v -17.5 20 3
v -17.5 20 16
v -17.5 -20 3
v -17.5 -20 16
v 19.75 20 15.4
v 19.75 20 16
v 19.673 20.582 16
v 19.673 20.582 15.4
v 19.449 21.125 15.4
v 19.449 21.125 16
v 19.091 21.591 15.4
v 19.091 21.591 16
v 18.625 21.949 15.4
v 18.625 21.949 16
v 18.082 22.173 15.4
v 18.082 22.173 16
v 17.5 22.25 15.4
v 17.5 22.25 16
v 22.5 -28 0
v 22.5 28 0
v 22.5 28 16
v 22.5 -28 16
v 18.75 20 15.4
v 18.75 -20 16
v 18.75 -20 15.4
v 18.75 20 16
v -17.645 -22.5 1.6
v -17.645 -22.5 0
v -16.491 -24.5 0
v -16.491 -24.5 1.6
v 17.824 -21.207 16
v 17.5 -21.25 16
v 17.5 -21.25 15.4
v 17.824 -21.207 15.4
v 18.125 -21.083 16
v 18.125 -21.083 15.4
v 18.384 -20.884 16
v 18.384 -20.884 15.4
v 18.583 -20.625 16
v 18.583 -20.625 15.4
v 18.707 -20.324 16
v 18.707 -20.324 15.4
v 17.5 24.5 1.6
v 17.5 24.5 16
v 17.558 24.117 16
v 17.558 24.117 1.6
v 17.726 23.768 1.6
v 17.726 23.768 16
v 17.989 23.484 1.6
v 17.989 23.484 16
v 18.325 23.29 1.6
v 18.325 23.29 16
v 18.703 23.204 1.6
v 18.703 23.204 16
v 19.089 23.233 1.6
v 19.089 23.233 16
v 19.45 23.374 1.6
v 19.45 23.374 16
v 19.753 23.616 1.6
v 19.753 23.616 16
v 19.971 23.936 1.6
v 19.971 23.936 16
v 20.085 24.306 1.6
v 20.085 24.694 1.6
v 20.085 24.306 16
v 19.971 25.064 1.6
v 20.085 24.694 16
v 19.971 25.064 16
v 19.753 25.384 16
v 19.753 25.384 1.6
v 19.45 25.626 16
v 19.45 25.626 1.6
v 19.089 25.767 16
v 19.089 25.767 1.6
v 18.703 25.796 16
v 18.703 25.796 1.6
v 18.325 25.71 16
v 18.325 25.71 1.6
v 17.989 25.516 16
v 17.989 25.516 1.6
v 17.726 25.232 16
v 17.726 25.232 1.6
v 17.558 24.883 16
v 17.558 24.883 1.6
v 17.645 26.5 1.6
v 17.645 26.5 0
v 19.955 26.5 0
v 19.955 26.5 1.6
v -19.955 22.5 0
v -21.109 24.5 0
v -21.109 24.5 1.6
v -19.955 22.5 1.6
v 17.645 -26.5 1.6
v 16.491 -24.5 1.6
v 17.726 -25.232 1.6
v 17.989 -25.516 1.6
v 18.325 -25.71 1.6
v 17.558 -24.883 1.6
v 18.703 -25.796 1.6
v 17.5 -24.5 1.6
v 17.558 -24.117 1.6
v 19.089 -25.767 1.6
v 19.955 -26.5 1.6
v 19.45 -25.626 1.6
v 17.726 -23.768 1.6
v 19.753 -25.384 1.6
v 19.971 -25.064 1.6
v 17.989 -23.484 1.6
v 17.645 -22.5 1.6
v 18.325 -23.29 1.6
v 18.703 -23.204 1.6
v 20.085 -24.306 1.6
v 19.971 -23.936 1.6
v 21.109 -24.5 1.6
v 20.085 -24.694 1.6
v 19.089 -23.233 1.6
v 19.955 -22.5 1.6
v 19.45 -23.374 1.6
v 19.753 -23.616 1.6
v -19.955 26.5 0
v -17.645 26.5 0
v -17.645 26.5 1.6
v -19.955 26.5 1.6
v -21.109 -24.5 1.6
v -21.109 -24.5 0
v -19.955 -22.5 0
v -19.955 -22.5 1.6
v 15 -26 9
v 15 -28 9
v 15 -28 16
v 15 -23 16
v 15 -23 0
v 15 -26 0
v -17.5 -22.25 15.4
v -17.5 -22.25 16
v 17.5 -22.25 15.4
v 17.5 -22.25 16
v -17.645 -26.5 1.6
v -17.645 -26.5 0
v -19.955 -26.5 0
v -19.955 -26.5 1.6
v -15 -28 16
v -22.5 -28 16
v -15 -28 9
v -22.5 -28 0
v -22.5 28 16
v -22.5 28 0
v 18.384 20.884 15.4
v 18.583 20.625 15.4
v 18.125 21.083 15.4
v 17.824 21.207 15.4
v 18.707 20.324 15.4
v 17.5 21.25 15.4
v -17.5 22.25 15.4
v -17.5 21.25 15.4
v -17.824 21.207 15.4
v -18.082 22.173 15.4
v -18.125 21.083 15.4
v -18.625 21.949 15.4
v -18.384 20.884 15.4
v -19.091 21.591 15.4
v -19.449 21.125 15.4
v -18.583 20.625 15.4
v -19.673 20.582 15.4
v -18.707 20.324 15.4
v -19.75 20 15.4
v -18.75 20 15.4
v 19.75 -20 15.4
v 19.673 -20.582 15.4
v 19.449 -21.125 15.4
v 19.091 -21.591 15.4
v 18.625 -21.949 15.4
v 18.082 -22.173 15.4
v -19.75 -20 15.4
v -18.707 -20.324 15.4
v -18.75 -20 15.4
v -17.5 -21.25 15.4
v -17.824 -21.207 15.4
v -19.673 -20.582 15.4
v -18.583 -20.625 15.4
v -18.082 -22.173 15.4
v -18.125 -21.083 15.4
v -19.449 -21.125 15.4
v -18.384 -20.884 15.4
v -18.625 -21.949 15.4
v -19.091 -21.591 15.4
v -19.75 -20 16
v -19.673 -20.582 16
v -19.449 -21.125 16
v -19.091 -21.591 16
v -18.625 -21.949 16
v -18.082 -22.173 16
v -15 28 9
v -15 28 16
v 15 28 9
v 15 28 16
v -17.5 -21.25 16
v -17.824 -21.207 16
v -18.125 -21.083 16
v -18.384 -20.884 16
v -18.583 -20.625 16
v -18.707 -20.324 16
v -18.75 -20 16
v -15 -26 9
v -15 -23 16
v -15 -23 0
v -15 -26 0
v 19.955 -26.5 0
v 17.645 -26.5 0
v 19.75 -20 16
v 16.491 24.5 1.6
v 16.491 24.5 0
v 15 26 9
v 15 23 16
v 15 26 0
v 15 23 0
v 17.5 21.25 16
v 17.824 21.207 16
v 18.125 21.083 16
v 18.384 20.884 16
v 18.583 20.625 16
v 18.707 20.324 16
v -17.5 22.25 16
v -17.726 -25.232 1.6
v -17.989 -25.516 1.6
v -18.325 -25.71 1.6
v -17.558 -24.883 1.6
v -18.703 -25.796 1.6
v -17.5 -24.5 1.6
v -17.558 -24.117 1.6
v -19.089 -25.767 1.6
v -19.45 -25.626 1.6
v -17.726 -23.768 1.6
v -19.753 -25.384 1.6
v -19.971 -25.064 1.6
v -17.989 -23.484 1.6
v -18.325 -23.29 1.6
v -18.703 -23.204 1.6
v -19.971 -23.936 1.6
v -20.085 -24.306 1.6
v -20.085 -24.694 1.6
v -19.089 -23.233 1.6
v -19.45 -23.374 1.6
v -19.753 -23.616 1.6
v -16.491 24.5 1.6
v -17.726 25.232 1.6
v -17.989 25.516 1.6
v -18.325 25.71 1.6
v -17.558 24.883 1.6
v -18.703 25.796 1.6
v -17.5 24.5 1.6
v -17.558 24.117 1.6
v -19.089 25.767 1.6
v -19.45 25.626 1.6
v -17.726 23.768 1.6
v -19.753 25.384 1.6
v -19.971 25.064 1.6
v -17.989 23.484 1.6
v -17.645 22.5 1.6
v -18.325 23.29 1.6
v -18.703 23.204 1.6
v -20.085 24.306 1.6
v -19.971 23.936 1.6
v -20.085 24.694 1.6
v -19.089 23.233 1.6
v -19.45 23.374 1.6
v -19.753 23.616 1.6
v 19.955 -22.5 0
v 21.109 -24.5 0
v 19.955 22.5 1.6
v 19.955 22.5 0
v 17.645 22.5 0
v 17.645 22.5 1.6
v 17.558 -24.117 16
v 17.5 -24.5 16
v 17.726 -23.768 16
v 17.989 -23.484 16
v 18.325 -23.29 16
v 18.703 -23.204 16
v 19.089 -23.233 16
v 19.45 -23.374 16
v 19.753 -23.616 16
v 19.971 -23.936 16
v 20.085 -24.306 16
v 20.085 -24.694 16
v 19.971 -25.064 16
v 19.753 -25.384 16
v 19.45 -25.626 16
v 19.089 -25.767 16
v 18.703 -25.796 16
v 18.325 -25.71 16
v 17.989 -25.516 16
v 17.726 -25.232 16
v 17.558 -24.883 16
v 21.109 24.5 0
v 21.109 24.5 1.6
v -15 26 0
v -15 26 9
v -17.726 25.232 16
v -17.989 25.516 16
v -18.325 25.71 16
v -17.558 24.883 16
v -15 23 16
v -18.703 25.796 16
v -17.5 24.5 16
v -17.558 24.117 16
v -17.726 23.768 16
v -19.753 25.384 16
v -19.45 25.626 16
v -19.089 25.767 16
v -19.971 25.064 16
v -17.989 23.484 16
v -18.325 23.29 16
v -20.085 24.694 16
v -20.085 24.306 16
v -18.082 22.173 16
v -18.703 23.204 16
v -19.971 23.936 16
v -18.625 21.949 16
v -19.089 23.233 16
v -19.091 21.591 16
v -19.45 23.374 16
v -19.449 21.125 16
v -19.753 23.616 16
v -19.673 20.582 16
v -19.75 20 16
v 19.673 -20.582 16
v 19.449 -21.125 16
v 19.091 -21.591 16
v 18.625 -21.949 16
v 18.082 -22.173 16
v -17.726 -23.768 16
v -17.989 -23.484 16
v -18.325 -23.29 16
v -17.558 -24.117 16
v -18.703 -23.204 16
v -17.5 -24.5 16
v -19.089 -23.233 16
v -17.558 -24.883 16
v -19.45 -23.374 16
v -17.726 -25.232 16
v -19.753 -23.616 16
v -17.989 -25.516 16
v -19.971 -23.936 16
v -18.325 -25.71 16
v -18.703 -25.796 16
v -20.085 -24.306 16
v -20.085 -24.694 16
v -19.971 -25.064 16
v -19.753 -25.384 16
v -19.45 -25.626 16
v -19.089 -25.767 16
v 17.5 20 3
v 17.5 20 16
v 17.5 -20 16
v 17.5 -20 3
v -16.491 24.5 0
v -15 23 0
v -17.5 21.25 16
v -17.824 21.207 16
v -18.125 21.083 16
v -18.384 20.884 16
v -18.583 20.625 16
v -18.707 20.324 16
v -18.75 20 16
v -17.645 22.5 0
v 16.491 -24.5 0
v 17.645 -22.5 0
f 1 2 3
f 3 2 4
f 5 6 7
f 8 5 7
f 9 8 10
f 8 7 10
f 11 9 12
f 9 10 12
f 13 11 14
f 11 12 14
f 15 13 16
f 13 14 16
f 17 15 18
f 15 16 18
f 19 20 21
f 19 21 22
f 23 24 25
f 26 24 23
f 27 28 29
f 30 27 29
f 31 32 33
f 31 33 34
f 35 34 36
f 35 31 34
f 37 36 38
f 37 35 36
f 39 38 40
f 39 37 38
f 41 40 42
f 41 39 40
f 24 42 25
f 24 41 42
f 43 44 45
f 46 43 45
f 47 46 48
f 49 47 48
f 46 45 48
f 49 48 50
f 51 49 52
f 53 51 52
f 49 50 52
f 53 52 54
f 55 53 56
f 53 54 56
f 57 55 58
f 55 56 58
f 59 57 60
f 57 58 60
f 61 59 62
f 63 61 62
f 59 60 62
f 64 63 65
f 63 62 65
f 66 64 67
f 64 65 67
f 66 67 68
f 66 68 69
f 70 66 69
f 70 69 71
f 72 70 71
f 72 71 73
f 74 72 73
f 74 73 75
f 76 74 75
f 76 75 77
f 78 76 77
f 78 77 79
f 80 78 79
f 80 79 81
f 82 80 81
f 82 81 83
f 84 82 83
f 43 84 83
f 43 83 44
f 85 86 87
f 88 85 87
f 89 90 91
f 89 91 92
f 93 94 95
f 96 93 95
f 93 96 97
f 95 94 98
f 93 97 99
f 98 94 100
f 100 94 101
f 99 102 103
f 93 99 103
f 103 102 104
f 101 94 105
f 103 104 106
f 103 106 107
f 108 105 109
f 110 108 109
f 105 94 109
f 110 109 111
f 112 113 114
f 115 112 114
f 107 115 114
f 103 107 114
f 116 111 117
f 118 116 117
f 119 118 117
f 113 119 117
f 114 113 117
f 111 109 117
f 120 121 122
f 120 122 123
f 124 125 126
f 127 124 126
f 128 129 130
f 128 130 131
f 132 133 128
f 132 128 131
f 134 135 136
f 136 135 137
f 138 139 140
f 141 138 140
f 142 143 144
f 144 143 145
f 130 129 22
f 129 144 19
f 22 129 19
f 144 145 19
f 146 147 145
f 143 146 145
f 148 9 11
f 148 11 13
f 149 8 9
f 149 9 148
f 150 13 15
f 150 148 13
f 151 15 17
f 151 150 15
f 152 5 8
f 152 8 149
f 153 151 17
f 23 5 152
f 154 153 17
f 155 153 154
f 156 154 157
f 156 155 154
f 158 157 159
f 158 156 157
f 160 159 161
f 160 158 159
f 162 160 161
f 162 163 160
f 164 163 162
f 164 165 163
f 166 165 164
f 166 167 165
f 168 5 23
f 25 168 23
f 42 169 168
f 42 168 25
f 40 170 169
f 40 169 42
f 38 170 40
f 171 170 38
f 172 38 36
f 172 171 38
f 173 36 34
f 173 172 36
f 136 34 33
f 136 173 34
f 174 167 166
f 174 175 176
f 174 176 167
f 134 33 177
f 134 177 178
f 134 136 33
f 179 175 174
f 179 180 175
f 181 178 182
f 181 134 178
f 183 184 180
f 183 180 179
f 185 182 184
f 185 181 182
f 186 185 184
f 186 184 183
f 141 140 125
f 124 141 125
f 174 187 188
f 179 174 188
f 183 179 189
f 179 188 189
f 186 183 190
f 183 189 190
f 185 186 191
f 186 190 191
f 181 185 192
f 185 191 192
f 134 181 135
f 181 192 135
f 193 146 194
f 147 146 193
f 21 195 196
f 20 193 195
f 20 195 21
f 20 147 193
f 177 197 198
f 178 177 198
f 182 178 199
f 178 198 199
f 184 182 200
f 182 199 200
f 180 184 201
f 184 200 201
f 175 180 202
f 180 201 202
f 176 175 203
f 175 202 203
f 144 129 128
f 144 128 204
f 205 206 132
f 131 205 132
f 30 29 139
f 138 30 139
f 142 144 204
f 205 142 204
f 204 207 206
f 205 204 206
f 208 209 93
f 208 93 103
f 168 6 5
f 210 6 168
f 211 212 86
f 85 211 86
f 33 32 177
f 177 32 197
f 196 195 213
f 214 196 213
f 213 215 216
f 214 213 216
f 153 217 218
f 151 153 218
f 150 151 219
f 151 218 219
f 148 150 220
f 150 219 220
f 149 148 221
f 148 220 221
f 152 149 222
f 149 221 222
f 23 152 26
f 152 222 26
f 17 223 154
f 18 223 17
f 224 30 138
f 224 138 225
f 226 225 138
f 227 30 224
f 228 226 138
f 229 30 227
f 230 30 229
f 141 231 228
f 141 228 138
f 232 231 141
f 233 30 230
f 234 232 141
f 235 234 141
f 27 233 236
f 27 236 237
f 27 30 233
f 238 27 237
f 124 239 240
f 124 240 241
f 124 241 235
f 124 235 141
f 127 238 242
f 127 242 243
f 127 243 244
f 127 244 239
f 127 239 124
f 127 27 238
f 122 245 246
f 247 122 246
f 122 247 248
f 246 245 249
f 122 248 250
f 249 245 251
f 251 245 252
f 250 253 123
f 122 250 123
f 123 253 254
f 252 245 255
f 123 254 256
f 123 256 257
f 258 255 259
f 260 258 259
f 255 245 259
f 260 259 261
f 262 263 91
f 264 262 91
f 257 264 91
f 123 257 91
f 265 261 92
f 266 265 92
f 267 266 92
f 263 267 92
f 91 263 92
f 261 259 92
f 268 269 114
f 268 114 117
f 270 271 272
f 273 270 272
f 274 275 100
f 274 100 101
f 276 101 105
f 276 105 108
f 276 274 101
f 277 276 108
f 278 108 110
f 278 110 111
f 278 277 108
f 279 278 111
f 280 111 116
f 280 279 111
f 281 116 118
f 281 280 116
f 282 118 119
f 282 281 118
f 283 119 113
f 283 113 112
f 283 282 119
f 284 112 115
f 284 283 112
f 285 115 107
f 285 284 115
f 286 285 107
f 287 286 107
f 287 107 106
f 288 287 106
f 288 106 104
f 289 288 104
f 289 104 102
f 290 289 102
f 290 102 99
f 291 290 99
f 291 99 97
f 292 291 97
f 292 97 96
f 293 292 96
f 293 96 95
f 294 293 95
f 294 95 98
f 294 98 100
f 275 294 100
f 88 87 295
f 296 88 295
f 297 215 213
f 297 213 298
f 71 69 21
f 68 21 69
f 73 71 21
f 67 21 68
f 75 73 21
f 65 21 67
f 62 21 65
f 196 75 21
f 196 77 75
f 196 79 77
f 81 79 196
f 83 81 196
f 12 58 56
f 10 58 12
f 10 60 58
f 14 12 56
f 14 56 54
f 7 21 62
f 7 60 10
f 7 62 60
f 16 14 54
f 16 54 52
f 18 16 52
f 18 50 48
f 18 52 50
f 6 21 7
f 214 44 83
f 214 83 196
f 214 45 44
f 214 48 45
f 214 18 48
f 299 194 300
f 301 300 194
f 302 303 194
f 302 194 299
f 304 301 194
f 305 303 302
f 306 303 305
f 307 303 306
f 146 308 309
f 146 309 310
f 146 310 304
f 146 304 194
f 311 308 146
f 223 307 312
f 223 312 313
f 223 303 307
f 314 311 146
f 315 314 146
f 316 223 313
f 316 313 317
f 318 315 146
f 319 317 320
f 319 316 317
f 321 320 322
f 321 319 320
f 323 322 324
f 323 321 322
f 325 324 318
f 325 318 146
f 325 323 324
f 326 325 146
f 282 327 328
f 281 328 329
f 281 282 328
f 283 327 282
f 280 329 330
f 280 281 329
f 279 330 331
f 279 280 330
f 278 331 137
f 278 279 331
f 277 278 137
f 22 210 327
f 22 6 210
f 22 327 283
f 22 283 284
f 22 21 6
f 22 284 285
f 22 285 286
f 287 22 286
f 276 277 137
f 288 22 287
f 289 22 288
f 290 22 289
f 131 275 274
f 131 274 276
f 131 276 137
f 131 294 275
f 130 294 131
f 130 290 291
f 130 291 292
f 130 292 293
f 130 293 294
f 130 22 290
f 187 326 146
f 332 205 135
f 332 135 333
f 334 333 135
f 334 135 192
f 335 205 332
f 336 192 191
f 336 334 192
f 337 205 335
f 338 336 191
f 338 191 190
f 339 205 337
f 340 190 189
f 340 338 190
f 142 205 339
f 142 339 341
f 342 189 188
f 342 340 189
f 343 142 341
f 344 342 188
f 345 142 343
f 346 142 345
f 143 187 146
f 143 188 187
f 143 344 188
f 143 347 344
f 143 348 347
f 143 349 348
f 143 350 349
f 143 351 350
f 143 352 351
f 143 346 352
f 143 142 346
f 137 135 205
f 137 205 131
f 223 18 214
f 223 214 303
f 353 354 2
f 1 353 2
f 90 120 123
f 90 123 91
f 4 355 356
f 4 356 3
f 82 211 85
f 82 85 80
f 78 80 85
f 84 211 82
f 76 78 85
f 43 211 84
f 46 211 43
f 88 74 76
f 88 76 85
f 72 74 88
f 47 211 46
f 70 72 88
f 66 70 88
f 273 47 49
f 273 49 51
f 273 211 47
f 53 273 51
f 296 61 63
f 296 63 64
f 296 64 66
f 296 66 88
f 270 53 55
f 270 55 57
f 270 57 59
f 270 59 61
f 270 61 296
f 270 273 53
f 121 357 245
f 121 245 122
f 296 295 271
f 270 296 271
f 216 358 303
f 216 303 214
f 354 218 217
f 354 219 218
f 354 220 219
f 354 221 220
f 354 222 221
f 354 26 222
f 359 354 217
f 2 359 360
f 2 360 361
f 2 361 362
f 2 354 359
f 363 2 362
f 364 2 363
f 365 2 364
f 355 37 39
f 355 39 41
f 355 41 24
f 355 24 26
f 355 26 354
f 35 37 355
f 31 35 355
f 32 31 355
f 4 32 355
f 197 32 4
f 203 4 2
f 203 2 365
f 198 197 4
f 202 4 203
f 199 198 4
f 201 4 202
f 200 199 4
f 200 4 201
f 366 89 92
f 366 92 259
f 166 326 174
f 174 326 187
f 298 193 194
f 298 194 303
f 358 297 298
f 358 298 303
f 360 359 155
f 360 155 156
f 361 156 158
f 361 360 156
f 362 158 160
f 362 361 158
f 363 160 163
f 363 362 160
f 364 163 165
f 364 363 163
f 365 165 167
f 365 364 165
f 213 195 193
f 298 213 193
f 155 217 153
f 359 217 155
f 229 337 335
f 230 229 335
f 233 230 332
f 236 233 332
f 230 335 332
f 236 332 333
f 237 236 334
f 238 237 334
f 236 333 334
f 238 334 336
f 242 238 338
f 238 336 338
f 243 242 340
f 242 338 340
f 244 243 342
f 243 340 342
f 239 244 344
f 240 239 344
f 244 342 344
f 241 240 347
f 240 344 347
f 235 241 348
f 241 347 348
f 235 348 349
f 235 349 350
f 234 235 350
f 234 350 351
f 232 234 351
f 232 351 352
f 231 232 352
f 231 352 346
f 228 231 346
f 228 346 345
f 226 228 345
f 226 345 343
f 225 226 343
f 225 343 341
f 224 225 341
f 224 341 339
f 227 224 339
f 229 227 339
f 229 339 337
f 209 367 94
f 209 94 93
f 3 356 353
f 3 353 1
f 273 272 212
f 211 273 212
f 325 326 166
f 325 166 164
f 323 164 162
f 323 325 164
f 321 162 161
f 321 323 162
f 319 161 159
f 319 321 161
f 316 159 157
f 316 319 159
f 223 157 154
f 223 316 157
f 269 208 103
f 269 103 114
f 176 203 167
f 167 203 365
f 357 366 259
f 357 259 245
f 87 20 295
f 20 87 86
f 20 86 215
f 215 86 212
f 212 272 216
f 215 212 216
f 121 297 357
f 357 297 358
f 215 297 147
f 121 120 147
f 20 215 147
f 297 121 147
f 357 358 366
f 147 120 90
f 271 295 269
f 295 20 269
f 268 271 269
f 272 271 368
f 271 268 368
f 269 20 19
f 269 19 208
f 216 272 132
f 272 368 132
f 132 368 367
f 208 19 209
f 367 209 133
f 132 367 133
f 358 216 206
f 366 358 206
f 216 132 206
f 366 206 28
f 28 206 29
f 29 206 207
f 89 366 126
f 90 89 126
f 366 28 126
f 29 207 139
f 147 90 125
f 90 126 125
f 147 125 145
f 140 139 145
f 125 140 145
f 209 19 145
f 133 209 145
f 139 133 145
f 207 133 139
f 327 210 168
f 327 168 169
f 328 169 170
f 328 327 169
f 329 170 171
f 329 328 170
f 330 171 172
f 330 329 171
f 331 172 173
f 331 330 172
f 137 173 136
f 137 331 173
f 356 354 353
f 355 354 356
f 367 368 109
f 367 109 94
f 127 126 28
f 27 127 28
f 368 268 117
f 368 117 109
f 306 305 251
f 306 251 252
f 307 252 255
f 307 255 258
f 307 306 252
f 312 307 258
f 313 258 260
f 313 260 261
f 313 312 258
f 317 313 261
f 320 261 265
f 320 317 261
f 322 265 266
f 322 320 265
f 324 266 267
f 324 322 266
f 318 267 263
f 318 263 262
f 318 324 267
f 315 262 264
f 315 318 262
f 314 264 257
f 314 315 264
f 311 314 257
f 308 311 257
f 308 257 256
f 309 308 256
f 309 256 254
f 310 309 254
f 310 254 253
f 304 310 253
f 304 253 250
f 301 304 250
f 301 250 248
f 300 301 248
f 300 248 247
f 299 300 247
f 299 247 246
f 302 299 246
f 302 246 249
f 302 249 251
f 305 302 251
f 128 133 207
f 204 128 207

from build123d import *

# Parameters (mm, degrees)
F1_DEPTH  = 16
F2_W      = 17.5
F2_H      = 20
F3_DEPTH  = 13
F5_DEPTH  = 0.6
F7_DEPTH  = 1.6
F9_D      = 2.6
F10_W     = 15
F10_H     = 4.3693144321
F11_DEPTH = 7


with BuildPart() as f1:
    # F0 (on Top) → F1 (new body)
    with BuildSketch(Plane.XY):
        Polygon((15, 23), (0, 23), (0, 0), (22.5, 0), (22.5, 28), (0, 28), (0, 26), (15, 26), align=None)
    extrude(amount=F1_DEPTH)

    # F2 (on face) → F3 (cut)
    with BuildSketch(Plane.XY.offset(16)):
        with Locations((8.75, 10)):
            Rectangle(F2_W, F2_H)
    extrude(amount=-F3_DEPTH, mode=Mode.SUBTRACT)

    # F4 (on face) → F5 (cut)
    with BuildSketch(Plane.XY.offset(16)):
        with BuildLine():
            Line((17.5, 22.25), (0, 22.25))
            Line((0, 22.25), (0, 21.25))
            Line((0, 21.25), (17.5, 21.25))
            ThreePointArc((17.5, 21.25), (18.3838834765, 20.8838834765), (18.75, 20))
            Line((18.75, 20), (18.75, 0))
            Line((18.75, 0), (19.75, 0))
            Line((19.75, 0), (19.75, 20))
            ThreePointArc((19.75, 20), (19.0909902577, 21.5909902577), (17.5, 22.25))
        make_face()
    extrude(amount=-F5_DEPTH, mode=Mode.SUBTRACT)

    # F6 (on face) → F7 (cut)
    with BuildSketch(Plane(origin=(0, 0, 0), x_dir=(1, 0, 0), z_dir=(0, 0, -1))):
        Polygon((19.9547005384, -26.5), (21.1094010768, -24.5), (19.9547005384, -22.5), (17.6452994616, -22.5), (16.4905989232, -24.5), (17.6452994616, -26.5), align=None)
    extrude(amount=-F7_DEPTH, mode=Mode.SUBTRACT)

    # F9 (through all)
    with Locations(Plane(origin=(0, 0, 0), x_dir=(1, 0, 0), z_dir=(0, 0, -1))):
        with Locations((18.8, -24.5)):
            Hole(F9_D / 2)

    # F10 (on face) → F11 (cut)
    with BuildSketch(Plane.XY.offset(16)):
        with Locations((7.5, 28.1846572161)):
            Rectangle(F10_W, F10_H)
    extrude(amount=-F11_DEPTH, mode=Mode.SUBTRACT)

    # F12: F1 across plane


with BuildPart() as f1_1:
    add(f1.part)
    add(f1.part.mirror(Plane.YZ))

    # F13: F1 across plane


with BuildPart() as f1_2:
    add(f1_1.part)
    add(f1_1.part.mirror(Plane.XZ))


solid = f1_2.part
